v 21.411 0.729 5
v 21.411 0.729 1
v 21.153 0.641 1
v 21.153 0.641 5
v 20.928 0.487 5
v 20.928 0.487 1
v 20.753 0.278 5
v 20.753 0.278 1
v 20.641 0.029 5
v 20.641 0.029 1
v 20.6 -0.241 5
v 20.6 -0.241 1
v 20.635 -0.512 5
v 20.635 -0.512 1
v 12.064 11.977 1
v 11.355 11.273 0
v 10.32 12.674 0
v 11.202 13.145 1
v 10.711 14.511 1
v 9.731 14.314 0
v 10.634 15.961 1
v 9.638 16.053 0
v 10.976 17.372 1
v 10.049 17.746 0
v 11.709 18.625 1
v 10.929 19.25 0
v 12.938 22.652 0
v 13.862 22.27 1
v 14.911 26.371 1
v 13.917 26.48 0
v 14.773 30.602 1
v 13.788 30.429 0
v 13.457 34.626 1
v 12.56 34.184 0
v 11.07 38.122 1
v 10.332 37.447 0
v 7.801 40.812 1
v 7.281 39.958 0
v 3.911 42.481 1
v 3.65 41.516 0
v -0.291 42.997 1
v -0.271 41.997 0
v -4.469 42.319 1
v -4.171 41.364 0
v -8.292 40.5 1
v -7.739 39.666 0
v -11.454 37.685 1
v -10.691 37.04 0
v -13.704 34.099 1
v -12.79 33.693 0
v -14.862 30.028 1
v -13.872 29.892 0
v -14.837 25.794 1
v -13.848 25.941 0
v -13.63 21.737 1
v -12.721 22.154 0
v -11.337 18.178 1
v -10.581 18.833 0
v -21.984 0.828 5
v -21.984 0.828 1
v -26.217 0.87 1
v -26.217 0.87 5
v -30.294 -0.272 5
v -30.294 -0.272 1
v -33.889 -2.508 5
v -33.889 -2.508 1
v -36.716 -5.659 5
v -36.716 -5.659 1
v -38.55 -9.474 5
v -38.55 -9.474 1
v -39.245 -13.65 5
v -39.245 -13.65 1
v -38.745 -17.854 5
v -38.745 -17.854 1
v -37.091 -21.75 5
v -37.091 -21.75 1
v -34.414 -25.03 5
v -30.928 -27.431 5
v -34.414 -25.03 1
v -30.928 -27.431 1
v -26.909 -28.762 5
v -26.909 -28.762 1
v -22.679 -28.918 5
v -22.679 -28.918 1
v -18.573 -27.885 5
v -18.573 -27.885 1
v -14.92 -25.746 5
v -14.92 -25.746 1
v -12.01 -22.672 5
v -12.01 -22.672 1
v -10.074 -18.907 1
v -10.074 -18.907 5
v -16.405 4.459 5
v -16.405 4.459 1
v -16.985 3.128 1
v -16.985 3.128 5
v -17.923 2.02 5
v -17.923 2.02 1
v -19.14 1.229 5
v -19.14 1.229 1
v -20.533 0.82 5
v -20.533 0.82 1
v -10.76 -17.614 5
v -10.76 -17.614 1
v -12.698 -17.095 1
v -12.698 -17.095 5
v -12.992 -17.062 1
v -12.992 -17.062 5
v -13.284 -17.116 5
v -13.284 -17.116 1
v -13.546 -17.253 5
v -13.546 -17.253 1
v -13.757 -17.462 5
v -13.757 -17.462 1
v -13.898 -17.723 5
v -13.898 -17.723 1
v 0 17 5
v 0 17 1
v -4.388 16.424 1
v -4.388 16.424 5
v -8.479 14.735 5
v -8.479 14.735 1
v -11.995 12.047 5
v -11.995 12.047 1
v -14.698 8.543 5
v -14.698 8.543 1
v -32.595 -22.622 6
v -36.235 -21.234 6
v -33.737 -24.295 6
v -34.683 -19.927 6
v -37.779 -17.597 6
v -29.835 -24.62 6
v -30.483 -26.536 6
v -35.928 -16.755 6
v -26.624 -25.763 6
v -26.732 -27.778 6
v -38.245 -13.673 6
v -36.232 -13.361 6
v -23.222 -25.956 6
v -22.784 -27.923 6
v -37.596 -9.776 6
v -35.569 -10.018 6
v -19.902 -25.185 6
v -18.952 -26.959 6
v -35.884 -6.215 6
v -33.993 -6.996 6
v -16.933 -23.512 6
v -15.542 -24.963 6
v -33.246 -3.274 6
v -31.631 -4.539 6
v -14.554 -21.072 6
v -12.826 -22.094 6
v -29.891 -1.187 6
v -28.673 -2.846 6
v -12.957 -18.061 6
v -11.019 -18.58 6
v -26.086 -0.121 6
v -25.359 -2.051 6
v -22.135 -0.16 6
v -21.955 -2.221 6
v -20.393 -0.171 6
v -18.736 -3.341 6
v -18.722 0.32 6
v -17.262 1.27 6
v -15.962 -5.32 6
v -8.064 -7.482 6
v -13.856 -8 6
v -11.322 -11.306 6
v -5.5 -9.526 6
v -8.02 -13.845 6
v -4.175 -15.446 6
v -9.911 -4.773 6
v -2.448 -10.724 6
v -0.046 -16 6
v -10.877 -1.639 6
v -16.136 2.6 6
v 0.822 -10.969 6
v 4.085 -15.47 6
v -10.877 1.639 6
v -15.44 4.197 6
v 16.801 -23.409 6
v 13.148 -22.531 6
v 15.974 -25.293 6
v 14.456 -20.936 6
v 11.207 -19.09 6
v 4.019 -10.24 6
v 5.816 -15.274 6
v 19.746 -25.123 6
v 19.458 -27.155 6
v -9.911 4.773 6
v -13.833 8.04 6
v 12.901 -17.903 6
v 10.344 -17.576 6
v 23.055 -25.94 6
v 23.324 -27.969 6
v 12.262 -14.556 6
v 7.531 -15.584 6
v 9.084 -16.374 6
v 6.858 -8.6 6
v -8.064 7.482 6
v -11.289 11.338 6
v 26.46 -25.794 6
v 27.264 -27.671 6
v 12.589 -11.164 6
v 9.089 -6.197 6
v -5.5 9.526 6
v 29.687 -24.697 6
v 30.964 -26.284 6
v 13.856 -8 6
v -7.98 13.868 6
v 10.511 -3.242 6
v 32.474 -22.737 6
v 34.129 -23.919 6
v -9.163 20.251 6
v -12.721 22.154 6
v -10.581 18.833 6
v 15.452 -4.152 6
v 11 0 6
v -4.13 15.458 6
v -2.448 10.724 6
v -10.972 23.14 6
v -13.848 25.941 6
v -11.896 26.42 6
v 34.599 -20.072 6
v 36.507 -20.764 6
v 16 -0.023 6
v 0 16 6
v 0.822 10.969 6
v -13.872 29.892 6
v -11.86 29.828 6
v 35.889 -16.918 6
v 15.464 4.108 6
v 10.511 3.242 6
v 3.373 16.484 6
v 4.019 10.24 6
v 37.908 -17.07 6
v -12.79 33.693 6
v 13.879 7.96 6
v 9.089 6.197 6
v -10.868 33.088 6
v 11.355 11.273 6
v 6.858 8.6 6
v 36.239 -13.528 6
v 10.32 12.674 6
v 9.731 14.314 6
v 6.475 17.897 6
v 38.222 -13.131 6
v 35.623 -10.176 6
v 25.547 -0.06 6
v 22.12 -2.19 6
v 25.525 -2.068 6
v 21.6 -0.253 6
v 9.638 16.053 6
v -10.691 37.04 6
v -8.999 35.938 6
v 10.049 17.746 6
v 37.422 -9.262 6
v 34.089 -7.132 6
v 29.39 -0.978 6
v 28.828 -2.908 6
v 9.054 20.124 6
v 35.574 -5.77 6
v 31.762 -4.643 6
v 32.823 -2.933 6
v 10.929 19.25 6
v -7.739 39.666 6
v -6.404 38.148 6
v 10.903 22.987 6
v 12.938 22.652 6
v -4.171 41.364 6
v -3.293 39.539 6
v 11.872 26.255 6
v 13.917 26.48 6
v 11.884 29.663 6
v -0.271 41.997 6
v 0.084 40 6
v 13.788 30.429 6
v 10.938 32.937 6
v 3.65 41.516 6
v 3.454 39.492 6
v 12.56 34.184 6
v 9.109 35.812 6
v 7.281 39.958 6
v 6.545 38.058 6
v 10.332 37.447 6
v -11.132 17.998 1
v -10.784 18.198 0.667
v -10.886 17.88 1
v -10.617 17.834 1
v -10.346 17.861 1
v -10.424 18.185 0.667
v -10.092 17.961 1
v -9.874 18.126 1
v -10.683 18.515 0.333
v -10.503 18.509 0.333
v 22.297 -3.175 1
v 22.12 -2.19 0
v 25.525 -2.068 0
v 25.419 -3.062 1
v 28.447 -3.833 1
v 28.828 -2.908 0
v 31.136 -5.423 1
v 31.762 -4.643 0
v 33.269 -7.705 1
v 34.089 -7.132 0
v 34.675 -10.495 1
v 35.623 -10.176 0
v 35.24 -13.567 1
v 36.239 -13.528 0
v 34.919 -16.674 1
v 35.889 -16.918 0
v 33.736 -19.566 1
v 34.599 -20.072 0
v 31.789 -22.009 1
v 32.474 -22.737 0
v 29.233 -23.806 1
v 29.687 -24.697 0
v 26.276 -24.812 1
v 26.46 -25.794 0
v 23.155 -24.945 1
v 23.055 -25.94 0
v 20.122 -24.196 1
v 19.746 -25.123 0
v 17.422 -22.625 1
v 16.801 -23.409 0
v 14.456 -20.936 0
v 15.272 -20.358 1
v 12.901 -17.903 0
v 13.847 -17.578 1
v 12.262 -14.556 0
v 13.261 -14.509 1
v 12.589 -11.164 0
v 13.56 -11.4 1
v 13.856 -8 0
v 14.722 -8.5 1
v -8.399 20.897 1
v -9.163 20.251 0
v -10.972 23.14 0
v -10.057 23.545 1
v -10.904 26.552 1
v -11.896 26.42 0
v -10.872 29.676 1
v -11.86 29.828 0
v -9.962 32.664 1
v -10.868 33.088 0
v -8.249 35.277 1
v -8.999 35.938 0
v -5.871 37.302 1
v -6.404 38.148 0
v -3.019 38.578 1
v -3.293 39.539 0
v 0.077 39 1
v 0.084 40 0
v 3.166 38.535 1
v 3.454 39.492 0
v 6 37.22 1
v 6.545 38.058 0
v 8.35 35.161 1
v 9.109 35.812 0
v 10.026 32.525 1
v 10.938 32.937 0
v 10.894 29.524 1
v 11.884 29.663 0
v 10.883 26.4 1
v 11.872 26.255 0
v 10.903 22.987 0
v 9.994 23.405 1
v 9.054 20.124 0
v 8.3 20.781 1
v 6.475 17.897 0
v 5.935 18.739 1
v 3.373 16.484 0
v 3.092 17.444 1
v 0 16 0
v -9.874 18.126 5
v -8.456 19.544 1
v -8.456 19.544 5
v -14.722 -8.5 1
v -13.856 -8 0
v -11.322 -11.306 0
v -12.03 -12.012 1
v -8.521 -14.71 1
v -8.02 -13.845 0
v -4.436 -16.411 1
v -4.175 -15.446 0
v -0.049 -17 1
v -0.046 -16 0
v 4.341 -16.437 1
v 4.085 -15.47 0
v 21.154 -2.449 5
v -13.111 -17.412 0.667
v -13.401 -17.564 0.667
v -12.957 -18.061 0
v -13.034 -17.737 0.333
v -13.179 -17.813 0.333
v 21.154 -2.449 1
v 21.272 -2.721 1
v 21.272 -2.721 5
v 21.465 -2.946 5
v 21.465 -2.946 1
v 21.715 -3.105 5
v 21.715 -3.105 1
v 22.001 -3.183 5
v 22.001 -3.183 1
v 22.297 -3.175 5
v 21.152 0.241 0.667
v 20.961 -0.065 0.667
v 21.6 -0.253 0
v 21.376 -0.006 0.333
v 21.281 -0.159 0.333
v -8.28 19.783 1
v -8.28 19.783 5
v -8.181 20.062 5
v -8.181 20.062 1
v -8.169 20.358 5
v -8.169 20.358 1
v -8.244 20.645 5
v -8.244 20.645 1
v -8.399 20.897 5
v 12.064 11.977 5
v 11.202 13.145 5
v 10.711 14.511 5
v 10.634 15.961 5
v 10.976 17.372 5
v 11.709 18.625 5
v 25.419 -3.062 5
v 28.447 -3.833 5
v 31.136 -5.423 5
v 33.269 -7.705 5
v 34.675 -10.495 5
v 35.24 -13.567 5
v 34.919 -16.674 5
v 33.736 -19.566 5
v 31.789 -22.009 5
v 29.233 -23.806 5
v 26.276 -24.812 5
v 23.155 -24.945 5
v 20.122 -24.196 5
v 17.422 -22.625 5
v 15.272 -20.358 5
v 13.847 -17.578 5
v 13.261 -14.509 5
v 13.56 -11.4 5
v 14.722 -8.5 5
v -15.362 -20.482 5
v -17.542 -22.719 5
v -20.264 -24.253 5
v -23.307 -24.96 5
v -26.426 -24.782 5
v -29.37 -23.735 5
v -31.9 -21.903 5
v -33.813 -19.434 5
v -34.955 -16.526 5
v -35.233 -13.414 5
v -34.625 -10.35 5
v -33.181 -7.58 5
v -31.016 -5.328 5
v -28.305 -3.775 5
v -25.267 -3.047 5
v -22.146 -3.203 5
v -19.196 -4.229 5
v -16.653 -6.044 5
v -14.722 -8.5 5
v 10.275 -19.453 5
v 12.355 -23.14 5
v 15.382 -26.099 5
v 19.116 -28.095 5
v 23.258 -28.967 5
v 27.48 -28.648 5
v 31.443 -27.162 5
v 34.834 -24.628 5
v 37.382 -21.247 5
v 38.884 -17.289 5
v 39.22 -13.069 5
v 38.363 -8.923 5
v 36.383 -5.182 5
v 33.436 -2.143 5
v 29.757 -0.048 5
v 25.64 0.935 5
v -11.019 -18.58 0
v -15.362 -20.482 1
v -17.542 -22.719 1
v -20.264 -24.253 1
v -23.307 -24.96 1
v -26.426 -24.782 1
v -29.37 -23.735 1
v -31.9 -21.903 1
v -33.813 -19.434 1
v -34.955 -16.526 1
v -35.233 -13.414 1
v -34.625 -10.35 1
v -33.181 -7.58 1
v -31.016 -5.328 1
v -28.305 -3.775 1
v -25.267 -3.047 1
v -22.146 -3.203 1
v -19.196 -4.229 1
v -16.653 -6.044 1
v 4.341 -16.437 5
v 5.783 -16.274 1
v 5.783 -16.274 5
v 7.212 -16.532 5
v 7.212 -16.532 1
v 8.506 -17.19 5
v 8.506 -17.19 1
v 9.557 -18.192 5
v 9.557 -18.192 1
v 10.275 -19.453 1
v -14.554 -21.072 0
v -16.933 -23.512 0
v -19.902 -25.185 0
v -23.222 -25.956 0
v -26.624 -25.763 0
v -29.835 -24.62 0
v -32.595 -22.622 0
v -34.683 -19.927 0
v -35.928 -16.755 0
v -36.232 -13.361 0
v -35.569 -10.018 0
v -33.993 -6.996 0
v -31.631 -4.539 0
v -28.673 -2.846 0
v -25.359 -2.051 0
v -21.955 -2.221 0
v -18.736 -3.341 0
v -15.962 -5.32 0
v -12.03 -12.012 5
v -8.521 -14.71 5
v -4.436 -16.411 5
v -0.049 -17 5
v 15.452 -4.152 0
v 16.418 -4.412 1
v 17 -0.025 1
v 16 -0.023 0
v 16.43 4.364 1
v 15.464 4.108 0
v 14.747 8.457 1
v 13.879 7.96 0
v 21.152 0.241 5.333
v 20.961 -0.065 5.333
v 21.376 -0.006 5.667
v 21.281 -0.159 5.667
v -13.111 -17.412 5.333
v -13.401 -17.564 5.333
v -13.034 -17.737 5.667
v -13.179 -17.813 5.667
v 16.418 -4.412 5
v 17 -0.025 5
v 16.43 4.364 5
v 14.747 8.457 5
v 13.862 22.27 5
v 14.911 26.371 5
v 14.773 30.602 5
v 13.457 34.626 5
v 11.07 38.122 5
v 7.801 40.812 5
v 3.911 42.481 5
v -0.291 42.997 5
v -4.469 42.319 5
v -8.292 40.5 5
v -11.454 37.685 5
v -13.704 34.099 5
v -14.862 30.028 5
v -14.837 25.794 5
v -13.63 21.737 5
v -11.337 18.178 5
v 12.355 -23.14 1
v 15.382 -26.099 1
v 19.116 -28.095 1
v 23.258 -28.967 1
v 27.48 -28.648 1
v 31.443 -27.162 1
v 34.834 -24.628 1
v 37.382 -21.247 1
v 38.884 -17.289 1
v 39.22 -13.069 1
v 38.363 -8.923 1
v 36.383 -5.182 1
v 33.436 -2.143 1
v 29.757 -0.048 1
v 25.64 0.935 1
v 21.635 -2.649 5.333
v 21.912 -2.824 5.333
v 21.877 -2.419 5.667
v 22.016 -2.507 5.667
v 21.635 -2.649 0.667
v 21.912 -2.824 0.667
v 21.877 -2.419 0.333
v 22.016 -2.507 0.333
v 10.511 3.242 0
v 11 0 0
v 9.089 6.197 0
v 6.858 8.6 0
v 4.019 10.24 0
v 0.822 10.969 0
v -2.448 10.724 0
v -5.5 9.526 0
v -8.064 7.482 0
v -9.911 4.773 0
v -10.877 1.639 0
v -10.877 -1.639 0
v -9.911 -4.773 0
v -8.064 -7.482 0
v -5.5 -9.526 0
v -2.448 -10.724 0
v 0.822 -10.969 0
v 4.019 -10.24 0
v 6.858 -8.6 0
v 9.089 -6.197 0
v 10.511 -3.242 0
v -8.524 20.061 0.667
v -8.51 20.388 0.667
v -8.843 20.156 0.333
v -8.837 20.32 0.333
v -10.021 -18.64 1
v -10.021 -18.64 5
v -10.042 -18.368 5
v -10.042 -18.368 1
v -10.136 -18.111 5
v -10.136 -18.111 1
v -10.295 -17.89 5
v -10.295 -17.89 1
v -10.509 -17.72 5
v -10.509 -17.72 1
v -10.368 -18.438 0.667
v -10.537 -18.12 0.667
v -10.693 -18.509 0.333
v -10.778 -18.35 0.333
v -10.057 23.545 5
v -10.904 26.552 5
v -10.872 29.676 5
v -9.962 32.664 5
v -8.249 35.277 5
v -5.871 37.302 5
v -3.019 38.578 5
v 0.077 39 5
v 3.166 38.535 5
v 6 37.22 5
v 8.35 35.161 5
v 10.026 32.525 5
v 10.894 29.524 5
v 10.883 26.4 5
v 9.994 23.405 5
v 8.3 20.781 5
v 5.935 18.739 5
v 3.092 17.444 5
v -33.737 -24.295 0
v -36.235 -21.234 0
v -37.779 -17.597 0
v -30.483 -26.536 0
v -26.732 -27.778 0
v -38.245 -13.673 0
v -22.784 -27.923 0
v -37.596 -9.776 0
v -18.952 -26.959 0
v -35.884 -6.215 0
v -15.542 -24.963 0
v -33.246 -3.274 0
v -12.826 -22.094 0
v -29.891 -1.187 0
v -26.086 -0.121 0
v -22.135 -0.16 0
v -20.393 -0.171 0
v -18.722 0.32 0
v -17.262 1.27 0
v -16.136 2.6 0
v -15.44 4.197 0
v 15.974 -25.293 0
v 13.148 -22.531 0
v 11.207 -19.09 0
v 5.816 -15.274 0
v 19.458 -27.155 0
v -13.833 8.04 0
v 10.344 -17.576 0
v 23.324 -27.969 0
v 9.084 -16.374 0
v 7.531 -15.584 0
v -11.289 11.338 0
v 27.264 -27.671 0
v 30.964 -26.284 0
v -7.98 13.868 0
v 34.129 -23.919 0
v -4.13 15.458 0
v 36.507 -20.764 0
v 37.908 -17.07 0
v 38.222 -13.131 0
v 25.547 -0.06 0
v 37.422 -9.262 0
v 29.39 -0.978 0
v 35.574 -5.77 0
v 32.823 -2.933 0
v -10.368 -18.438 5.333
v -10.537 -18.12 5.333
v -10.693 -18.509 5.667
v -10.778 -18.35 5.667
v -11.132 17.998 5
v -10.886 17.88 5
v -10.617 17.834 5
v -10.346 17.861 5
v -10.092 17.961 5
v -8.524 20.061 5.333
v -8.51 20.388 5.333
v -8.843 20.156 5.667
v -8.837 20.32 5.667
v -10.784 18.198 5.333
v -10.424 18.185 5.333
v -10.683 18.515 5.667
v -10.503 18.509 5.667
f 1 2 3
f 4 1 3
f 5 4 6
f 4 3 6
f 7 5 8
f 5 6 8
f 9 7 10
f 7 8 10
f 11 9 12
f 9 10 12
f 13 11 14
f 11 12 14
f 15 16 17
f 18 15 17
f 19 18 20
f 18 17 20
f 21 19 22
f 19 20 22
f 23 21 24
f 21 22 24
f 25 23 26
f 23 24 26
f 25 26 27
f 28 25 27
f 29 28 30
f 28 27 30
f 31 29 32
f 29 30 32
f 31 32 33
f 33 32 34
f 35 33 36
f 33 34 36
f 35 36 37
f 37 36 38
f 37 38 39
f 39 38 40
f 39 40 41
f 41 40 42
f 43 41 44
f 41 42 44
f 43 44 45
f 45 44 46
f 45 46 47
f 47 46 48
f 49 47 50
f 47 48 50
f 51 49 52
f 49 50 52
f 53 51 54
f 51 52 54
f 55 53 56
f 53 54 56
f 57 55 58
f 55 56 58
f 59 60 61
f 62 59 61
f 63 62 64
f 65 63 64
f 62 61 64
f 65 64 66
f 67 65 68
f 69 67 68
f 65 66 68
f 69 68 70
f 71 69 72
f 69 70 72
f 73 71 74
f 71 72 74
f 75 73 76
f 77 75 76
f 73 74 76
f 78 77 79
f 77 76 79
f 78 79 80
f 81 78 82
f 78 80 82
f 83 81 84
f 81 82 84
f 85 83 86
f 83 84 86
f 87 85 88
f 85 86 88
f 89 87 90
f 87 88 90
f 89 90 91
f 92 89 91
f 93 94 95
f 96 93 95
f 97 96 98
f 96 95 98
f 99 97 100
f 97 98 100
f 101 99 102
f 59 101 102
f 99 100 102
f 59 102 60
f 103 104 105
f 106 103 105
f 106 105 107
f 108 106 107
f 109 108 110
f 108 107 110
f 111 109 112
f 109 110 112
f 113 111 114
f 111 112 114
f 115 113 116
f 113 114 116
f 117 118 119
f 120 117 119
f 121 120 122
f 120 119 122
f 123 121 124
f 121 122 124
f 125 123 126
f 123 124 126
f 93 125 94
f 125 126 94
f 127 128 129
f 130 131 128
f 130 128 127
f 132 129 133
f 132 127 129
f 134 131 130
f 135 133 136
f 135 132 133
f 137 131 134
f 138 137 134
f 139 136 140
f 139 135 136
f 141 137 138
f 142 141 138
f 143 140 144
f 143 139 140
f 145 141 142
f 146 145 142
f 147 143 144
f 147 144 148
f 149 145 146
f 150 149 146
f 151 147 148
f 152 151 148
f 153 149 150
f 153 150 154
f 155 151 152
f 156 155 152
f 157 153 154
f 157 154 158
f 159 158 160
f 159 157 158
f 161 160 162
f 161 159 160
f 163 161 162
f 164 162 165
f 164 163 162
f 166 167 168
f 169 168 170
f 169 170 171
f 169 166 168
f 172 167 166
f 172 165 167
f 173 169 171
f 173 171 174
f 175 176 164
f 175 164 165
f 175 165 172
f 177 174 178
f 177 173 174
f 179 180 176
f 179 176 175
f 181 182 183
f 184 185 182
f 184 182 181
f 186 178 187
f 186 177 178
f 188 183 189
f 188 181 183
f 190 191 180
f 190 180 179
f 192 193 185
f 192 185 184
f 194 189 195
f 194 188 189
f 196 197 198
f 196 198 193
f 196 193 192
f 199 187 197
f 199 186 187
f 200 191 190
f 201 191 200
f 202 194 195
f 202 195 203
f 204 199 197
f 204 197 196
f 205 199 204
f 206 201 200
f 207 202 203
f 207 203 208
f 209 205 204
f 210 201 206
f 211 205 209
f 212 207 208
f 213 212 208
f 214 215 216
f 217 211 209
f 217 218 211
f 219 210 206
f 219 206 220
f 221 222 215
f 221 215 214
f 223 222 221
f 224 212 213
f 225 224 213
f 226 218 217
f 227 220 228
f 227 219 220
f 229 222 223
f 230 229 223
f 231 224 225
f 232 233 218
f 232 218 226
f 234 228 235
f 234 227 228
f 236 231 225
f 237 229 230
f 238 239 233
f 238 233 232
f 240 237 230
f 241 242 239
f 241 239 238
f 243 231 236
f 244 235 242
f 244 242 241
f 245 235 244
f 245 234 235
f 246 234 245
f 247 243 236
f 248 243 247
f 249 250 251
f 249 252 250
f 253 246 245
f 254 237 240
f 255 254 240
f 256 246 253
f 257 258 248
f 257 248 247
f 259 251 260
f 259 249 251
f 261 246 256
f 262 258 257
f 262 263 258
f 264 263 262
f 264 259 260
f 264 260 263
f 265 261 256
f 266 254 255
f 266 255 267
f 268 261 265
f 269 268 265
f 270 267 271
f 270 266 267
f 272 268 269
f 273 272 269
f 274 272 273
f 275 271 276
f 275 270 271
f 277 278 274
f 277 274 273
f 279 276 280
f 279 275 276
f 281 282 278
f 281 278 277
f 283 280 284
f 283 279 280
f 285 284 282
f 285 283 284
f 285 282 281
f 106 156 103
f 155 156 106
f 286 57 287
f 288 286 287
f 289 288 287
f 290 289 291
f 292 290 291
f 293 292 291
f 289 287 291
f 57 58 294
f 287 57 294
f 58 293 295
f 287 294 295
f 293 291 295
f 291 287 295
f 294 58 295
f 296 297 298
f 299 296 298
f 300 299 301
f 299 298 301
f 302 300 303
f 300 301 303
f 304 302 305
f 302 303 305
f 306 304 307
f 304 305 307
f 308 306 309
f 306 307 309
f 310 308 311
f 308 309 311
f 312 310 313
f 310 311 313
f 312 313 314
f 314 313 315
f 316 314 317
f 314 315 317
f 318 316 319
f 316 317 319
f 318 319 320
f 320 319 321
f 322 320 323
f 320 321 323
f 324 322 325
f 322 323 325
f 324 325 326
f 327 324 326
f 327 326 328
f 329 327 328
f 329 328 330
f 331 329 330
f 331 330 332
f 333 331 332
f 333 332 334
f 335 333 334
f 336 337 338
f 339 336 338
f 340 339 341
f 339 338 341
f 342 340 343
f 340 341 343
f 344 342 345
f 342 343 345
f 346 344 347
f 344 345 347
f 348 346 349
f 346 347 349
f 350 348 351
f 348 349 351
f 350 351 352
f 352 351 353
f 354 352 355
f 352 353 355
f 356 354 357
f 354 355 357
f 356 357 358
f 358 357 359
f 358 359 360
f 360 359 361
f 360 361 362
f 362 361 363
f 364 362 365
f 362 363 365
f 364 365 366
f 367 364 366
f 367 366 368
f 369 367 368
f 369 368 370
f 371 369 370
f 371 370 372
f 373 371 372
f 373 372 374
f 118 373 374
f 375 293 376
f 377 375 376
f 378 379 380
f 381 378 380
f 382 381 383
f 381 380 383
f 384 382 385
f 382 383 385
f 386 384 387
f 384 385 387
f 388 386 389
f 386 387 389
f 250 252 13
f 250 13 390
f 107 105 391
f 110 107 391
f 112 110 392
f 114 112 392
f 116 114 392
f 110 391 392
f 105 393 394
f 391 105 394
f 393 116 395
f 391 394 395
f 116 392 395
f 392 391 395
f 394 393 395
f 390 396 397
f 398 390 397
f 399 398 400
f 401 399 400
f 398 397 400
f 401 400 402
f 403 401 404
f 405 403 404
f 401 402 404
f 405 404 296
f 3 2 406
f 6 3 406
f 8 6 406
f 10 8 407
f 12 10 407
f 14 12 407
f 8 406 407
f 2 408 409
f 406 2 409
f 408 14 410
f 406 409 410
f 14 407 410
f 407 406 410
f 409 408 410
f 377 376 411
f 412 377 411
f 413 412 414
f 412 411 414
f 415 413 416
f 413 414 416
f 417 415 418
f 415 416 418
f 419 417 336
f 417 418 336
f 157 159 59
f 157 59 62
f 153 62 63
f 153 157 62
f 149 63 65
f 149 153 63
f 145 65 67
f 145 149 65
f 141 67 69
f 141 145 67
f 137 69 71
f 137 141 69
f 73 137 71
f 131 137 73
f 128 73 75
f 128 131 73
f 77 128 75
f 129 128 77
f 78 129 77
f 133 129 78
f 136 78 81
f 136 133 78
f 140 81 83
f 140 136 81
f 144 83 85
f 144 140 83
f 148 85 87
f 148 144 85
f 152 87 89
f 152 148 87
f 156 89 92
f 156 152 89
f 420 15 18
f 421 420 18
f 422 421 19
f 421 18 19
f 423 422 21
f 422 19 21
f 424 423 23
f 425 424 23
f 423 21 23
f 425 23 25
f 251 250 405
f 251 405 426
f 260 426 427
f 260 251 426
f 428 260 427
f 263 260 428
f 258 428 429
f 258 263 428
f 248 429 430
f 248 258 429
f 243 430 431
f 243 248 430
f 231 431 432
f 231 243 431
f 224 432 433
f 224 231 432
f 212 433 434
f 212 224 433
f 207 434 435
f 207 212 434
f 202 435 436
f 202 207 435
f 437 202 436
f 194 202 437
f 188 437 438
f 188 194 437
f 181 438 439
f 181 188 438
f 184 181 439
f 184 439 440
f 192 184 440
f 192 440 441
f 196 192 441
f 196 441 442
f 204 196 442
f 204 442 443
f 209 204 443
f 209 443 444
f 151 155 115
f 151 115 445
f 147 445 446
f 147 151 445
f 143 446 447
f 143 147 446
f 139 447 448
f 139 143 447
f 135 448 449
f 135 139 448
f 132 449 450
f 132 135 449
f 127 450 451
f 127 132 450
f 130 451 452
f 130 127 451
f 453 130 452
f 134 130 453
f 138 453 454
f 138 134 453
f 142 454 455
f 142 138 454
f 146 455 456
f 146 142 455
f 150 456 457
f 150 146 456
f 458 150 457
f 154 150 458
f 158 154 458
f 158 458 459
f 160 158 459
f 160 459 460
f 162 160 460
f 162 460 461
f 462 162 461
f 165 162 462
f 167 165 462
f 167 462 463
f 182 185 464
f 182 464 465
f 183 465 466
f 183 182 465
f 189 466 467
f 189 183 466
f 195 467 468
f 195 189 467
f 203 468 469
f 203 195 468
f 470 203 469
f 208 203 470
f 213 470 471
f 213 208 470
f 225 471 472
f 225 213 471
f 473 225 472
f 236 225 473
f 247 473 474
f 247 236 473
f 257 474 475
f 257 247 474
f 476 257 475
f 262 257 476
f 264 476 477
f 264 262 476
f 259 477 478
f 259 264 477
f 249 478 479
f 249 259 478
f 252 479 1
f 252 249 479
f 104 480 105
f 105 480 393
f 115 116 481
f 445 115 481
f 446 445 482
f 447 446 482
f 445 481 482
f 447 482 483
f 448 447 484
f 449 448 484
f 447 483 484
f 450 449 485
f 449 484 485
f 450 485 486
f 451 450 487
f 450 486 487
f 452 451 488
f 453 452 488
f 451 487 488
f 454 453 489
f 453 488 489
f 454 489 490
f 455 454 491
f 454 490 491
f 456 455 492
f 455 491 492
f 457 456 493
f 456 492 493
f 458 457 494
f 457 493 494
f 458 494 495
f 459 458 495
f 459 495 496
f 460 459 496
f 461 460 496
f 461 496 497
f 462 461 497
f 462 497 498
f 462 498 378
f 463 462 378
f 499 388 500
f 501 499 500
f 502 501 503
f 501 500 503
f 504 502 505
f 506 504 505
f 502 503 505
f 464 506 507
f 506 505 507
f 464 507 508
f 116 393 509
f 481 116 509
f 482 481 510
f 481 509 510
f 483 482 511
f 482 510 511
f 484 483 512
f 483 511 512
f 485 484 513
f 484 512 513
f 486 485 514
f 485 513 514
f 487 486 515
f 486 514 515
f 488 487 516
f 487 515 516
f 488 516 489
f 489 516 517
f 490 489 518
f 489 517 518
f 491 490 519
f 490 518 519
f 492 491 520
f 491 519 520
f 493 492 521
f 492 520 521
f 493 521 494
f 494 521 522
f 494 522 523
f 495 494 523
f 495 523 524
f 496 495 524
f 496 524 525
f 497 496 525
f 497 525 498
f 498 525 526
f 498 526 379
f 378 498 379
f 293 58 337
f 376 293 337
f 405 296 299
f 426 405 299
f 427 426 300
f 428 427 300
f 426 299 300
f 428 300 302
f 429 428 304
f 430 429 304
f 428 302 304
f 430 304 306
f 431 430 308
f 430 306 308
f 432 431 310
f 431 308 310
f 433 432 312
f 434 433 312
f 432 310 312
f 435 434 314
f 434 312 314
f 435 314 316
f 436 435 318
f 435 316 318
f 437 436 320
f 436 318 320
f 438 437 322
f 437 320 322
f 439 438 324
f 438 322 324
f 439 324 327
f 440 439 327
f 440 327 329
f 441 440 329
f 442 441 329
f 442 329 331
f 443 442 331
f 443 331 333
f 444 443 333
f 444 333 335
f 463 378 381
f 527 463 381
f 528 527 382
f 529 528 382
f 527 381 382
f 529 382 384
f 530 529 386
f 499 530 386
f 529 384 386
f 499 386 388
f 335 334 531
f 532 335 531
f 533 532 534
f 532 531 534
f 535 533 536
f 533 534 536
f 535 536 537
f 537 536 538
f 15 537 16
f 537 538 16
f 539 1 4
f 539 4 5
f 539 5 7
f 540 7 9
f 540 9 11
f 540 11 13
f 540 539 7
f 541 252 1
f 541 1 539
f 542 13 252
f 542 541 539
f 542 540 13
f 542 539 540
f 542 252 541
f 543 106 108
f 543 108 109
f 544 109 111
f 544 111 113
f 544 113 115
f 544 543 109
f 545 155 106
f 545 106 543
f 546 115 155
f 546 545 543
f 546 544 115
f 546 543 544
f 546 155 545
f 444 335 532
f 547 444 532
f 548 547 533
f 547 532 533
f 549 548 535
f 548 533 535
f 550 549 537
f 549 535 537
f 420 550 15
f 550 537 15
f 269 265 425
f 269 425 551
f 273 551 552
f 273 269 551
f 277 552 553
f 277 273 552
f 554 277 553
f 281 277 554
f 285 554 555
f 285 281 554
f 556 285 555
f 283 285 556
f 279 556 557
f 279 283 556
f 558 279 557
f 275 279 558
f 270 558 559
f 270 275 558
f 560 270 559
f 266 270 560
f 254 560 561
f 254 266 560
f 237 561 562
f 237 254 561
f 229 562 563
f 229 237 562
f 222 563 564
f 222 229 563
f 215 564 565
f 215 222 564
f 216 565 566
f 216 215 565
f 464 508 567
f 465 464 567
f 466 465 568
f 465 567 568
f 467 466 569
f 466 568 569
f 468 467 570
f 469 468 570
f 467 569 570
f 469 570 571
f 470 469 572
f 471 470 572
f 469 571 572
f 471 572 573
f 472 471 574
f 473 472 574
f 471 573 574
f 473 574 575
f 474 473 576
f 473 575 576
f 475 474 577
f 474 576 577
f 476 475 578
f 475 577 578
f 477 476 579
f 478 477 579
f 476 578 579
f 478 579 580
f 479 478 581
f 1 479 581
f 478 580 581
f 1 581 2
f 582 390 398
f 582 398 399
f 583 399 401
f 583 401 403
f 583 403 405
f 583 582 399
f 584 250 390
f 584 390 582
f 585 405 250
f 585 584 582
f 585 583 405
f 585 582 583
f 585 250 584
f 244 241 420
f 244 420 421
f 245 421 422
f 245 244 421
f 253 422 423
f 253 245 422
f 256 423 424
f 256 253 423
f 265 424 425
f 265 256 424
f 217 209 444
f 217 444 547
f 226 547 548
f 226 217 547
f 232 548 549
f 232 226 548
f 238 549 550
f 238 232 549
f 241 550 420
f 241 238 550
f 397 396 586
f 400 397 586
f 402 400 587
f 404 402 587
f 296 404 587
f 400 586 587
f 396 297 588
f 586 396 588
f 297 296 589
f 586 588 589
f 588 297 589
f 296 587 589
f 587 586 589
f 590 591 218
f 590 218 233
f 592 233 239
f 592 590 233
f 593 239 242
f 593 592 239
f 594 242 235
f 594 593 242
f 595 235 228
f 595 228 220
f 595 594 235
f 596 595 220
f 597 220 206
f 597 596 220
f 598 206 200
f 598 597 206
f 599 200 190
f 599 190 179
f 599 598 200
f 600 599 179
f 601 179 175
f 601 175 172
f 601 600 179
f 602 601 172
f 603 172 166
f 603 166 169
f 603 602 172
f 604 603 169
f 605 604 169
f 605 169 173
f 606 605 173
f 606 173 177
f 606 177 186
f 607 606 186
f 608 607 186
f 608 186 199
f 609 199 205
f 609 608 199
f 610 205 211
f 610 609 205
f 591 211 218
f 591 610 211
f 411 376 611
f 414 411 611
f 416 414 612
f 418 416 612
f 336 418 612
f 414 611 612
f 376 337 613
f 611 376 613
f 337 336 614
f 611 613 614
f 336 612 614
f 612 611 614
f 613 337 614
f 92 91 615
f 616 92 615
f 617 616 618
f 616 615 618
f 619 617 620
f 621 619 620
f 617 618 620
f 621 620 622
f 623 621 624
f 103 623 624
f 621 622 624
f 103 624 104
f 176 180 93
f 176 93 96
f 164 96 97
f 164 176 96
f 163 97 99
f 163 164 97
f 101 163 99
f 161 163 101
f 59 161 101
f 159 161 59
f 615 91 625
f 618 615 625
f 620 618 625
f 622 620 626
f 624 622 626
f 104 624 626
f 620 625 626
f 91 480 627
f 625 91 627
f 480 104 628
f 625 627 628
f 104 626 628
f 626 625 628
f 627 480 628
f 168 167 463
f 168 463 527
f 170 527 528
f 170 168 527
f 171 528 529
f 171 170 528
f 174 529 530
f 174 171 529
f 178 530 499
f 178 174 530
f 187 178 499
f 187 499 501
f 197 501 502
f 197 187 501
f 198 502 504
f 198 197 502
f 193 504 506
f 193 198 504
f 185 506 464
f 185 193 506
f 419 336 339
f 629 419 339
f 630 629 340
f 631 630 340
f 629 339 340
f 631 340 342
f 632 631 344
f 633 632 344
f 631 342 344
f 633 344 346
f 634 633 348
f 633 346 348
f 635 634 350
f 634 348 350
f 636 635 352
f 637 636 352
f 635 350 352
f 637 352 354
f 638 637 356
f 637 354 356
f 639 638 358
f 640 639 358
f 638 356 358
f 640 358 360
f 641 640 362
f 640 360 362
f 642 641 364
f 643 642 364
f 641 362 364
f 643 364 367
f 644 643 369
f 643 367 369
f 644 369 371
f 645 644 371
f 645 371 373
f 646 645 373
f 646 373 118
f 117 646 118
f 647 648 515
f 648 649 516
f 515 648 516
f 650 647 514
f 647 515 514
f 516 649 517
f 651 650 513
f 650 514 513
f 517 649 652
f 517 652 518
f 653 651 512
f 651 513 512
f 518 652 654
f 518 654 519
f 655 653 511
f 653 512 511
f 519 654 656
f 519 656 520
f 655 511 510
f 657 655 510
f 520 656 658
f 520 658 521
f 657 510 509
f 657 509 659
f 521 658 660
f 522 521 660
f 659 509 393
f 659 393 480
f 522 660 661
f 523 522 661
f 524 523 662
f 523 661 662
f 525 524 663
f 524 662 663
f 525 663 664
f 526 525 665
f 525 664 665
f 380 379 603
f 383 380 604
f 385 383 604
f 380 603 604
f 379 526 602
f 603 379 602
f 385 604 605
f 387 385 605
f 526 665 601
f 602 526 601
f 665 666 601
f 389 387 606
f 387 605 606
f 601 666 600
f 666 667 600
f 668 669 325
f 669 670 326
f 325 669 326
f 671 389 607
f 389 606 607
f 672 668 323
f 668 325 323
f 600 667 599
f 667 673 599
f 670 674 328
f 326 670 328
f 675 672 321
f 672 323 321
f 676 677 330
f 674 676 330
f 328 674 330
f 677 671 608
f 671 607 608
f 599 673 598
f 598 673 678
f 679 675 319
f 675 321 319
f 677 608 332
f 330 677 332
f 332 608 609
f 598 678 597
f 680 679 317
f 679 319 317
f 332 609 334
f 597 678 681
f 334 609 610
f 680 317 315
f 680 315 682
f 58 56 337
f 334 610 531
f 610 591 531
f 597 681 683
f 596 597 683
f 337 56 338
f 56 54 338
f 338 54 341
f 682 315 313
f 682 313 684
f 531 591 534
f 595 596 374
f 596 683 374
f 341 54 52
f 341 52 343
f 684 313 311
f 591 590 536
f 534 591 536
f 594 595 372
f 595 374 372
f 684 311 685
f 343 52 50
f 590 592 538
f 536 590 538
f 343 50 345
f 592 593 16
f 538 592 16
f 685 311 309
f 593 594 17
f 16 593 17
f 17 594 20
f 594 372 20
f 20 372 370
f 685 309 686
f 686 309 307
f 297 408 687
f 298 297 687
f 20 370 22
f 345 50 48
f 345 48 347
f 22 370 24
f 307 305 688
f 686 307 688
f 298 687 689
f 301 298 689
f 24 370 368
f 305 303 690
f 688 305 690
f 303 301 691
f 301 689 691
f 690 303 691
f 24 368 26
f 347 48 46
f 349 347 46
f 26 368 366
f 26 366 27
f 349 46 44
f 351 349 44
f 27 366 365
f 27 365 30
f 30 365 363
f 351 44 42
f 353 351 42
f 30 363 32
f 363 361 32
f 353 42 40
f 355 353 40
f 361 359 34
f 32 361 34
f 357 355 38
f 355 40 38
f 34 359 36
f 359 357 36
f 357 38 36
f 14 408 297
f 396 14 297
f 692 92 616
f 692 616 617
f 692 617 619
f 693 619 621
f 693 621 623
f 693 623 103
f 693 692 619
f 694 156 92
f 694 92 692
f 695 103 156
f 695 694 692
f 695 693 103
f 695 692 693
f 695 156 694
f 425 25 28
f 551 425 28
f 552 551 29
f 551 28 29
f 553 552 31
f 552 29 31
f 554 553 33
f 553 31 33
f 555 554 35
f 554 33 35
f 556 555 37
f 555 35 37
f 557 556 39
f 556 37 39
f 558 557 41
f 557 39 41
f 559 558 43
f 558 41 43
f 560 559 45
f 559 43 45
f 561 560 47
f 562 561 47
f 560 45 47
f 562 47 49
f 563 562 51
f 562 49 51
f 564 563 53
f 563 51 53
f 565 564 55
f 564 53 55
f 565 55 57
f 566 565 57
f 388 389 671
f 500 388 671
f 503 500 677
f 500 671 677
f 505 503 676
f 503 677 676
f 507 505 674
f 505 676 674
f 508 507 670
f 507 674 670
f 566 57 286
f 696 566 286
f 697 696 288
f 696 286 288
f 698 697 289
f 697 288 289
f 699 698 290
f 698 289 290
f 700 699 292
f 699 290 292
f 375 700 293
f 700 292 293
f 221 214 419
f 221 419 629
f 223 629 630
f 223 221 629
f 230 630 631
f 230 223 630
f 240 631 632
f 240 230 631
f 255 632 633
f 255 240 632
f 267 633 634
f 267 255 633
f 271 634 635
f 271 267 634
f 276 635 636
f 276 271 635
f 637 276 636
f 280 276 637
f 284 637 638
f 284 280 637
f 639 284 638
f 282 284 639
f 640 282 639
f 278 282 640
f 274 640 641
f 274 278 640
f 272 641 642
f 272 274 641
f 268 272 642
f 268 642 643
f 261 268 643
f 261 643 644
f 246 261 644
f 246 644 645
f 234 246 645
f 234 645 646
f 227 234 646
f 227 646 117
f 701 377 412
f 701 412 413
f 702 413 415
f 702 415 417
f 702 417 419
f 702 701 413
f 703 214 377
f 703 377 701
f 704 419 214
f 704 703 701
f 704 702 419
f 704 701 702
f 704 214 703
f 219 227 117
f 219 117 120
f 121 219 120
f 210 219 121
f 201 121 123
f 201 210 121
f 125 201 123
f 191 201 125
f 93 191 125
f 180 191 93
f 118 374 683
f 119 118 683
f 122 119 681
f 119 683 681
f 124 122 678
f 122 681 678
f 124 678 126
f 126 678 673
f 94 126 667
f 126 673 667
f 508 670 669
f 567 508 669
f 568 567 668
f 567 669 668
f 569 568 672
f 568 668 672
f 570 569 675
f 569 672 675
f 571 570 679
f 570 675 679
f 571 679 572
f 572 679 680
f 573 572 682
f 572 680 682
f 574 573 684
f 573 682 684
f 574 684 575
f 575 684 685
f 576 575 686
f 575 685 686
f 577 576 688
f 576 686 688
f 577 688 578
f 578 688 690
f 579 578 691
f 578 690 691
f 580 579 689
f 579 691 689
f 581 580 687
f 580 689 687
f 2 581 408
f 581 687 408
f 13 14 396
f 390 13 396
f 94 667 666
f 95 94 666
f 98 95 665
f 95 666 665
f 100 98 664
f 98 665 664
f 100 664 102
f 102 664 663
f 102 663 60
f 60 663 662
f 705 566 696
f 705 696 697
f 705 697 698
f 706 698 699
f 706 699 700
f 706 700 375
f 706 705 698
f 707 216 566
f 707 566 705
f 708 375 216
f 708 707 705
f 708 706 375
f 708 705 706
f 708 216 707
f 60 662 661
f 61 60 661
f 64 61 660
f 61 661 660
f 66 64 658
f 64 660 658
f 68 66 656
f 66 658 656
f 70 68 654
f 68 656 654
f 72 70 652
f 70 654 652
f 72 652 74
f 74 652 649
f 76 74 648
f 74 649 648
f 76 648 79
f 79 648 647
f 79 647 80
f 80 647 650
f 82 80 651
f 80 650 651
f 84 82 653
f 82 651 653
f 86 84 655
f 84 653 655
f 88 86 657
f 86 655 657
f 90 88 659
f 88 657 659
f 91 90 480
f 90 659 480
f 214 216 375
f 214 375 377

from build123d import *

# Parameters (mm, degrees)
F0_R     = 11
F1_DEPTH = 6
F2_SIZE  = 0.99999


# Not quite as in the source:
# - a fillet or chamfer is up to 0.001 mm smaller than in the source, because OpenCascade refuses the exact size


with BuildPart() as f1:
    # F0 (on Top) → F1 (new body)
    with BuildSketch(Plane.XY):
        with BuildLine():
            ThreePointArc((-8.3993012068, 20.8970612253), (4.6296691825, 37.9782845851), (0, 17))
            ThreePointArc((0, 17), (-10.3245446798, 13.5056942492), (-16.4047227892, 4.4592679005))
            ThreePointArc((-16.4047227892, 4.4592679005), (-18.5023983731, 1.580095835), (-21.984408769, 0.8281129622))
            ThreePointArc((-21.984408769, 0.8281129622), (-37.0912454672, -21.75043975), (-10.0741387442, -18.90728975))
            ThreePointArc((-10.0741387442, -18.90728975), (-10.1357694828, -18.1114057356), (-10.7602912032, -17.6142112737))
            Line((-10.7602912032, -17.6142112737), (-12.6979184167, -17.0950256266))
            ThreePointArc((-12.6979184167, -17.0950256266), (-13.420186678, -17.1748279717), (-13.8977352822, -17.7225388318))
            ThreePointArc((-13.8977352822, -17.7225388318), (-35.2049938341, -14.9797311694), (-14.7224318643, -8.5))
            ThreePointArc((-14.7224318643, -8.5), (-6.5340019757, -15.6941650999), (4.3405221105, -16.4365406278))
            ThreePointArc((4.3405221105, -16.4365406278), (7.882796053, -16.8135949396), (10.275037522, -19.4531129622))
            ThreePointArc((10.275037522, -19.4531129622), (37.3820561006, -21.2467409576), (21.4112626123, 0.7291848013))
            ThreePointArc((21.4112626123, 0.7291848013), (20.7528222067, 0.2778690088), (20.6345000323, -0.5115798972))
            Line((20.6345000323, -0.5115798972), (21.1536856793, -2.4492071107))
            ThreePointArc((21.1536856793, -2.4492071107), (21.5839306681, -3.0348086009), (22.297036489, -3.1745223935))
            ThreePointArc((22.297036489, -3.1745223935), (30.5753246516, -22.9985534157), (14.7224318643, -8.5))
            ThreePointArc((14.7224318643, -8.5), (16.8585466555, 2.1884708506), (12.0642006787, 11.9772727273))
            ThreePointArc((12.0642006787, 11.9772727273), (10.6196023201, 15.2334991046), (11.709371247, 18.625))
            ThreePointArc((11.709371247, 18.625), (-0.2908106334, 42.9971807076), (-11.3371238681, 18.1781049487))
            ThreePointArc((-11.3371238681, 18.1781049487), (-10.6170527239, 17.8335367268), (-9.8742088291, 18.1257911709))
            Line((-9.8742088291, 18.1257911709), (-8.4557672626, 19.5442327374))
            ThreePointArc((-8.4557672626, 19.5442327374), (-8.1637439901, 20.2096365726), (-8.3993012068, 20.8970612253))
        make_face()
        Circle(F0_R, mode=Mode.SUBTRACT)
    extrude(amount=F1_DEPTH)

    # F2 (size 1 in the source; OpenCascade refuses exactly that, so slightly less here)
    f2_edges = [f1.edges().sort_by_distance(p)[0] for p in [
        (-37.091245, -21.75044, 6),
        (37.382056, -21.246741, 0),
    ]]
    chamfer(f2_edges, length=F2_SIZE)


solid = f1.part
